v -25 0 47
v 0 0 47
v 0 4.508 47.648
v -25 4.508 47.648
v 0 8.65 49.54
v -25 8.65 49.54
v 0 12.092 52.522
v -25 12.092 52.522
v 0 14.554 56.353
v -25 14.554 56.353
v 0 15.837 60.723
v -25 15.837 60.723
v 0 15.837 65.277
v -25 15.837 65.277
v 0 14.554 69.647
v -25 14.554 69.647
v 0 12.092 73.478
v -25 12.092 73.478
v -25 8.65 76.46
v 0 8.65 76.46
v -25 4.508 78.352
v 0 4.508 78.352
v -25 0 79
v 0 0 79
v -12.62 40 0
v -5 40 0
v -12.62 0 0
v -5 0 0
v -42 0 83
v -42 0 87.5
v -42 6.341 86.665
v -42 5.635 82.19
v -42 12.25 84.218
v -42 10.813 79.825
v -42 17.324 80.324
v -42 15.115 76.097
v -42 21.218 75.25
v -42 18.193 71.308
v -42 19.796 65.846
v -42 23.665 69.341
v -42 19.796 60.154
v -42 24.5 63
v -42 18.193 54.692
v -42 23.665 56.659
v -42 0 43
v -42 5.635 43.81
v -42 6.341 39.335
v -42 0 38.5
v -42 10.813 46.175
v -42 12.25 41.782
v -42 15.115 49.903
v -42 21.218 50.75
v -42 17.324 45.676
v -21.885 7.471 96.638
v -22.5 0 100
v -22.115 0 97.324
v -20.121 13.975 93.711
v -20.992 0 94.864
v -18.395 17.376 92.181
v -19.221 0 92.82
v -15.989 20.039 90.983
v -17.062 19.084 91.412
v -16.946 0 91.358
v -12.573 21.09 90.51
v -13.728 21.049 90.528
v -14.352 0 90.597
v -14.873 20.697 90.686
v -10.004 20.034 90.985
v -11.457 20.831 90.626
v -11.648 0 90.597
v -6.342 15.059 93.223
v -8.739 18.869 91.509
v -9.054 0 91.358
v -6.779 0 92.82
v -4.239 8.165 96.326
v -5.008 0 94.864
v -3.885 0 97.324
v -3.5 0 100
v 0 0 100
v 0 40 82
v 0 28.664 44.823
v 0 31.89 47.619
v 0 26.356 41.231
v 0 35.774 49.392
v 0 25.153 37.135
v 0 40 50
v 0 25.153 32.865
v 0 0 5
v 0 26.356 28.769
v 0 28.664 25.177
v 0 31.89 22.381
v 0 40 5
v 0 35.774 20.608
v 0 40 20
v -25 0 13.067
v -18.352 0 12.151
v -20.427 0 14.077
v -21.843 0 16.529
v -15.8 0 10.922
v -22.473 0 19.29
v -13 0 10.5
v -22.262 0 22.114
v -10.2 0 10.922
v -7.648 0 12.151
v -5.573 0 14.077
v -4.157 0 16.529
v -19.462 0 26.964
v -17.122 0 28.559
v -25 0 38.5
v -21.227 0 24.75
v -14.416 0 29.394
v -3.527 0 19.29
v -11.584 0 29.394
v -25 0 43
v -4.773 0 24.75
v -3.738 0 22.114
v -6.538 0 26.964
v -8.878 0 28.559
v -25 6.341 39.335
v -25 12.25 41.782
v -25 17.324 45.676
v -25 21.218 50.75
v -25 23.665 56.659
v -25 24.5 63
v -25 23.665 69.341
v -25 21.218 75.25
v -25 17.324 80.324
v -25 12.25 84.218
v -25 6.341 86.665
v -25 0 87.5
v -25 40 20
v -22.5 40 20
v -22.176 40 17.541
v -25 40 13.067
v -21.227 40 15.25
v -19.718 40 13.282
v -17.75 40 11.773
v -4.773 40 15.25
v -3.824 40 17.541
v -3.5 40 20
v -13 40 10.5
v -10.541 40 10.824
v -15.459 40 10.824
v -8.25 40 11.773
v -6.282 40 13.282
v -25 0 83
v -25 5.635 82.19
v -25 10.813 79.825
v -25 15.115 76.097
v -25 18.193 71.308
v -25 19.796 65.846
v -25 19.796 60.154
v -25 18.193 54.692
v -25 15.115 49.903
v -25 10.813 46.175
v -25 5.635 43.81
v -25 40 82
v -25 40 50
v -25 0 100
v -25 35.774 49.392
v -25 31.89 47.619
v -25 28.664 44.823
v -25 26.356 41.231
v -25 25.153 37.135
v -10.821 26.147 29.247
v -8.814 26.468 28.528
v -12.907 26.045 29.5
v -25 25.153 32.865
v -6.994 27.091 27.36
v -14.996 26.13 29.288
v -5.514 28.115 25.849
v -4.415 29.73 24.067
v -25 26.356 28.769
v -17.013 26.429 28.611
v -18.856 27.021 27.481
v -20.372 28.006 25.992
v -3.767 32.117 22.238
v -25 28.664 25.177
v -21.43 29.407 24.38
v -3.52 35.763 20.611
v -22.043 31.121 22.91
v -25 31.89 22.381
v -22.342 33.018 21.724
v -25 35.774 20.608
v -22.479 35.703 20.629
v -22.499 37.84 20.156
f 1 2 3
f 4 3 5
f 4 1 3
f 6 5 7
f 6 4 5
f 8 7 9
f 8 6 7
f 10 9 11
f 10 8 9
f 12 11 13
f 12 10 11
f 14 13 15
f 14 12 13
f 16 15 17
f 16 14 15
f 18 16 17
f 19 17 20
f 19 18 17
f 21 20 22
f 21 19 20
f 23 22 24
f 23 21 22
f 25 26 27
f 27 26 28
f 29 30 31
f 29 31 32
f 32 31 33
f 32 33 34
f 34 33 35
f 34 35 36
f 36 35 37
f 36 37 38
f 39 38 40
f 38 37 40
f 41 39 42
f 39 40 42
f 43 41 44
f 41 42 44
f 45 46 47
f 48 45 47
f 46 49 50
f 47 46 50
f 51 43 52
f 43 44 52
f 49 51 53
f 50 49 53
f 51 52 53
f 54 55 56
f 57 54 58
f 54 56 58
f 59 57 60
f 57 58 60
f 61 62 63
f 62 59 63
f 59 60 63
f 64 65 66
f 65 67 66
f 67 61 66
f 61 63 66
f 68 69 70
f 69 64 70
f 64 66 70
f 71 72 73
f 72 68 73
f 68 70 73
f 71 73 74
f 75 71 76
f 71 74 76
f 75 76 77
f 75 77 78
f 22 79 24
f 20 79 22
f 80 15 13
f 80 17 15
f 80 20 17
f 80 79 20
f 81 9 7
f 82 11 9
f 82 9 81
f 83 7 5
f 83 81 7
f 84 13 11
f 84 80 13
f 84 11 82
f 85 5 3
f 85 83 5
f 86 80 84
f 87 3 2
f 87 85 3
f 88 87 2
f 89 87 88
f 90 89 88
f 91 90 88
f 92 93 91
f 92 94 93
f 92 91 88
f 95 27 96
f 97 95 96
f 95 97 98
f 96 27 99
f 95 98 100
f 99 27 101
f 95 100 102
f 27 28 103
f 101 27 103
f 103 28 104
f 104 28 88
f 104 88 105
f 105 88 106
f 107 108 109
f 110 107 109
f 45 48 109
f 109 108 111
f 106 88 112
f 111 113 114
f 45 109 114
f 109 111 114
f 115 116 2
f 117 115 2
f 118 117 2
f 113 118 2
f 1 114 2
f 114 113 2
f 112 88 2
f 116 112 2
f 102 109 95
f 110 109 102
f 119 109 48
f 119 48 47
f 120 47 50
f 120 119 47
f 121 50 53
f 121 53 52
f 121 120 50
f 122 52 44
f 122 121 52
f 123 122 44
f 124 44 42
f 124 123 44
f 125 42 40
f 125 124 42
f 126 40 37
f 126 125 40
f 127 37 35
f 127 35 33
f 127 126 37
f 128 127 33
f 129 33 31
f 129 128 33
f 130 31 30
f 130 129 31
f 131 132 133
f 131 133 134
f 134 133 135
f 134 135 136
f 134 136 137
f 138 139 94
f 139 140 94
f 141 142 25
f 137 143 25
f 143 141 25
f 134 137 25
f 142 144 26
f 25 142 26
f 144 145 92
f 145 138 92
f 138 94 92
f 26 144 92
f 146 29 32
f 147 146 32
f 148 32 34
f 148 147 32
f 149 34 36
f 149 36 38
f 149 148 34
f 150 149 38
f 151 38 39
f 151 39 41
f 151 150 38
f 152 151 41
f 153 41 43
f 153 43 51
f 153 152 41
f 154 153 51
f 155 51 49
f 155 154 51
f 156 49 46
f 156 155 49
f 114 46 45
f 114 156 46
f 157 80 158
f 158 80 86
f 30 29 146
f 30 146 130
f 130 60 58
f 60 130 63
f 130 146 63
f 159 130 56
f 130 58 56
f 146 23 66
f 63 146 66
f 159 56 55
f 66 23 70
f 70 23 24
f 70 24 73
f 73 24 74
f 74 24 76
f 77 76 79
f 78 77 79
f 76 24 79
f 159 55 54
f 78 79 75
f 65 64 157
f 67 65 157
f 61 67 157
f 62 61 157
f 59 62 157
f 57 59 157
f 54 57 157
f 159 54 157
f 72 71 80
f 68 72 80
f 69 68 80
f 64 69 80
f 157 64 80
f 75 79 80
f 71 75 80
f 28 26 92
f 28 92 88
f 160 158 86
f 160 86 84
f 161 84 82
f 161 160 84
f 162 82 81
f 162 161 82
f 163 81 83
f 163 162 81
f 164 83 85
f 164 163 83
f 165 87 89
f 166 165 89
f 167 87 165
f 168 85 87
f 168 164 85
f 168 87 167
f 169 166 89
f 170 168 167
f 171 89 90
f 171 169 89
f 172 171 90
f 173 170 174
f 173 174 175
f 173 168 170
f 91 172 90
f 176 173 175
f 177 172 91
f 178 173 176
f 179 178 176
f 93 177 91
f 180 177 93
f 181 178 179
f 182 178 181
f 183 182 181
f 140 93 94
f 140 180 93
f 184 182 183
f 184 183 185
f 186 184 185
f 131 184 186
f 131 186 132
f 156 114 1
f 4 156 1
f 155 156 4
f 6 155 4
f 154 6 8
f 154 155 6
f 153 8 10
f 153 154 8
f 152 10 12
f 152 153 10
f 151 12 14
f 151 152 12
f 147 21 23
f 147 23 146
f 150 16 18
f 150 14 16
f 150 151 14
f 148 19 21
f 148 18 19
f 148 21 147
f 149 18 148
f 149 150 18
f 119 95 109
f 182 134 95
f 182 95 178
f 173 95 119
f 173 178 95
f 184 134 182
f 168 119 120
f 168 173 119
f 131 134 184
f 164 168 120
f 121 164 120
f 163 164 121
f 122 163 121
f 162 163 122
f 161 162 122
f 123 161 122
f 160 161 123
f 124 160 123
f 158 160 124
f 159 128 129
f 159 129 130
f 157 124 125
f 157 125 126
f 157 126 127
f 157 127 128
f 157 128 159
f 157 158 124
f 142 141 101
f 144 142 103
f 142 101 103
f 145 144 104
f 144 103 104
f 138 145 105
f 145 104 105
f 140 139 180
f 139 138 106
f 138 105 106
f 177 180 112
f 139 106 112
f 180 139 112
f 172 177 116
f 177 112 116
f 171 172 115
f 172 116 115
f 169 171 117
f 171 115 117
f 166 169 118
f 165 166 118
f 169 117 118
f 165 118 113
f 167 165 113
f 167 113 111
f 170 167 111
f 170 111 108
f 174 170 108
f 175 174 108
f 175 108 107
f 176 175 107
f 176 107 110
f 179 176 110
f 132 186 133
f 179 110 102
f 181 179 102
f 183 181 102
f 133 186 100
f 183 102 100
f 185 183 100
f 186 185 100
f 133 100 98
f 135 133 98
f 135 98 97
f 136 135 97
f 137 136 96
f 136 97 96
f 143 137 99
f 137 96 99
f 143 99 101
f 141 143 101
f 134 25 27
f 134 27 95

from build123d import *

# Parameters (mm, degrees)
SALIENTE_EXTRUIR1_DEPTH    = 25
CORTAR_EXTRUIR1_START      = -94
CROQUIS2_R                 = 9.5
CORTAR_EXTRUIR1_DEPTH      = 148
CROQUIS3_R                 = 15
CROQUIS3_R_2               = 16
CORTAR_EXTRUIR2_DEPTH      = 94
CORTAR_EXTRUIR3_DEPTH      = 94
CHAFL_N2_SIZE              = 5
SALIENTE_EXTRUIR2_DEPTH    = 17
CHAFL_N2_OF_SIMETR_A1_SIZE = 5
CROQUIS6_W                 = 120.154705919
CROQUIS6_H                 = 59.700185721
CORTAR_EXTRUIR4_DEPTH      = 90


with BuildPart() as part:
    # Croquis1 → Saliente-Extruir1 (new body)
    with BuildSketch(Plane(origin=(0, 0, 0), x_dir=(0, 0, -1), z_dir=(1, 0, 0))):
        Polygon((-100, 0), (-82, 40), (0, 40), (0, 0), align=None)
    saliente_extruir1 = extrude(amount=SALIENTE_EXTRUIR1_DEPTH)

    # Croquis2 → Cortar-Extruir1 (cut)
    with BuildSketch(Plane(origin=(0, 40, 0), x_dir=(1, 0, 0), z_dir=(0, 1, 0)).offset(CORTAR_EXTRUIR1_START)):
        with Locations((13, -100)):
            Circle(CROQUIS2_R)
        with Locations((13, -20)):
            Circle(CROQUIS2_R)
    cortar_extruir1 = extrude(amount=CORTAR_EXTRUIR1_DEPTH, mode=Mode.SUBTRACT)

    # Croquis3 → Cortar-Extruir2 (cut, symmetric)
    with BuildSketch(Plane(origin=(25, 0, 0), x_dir=(0, 0, -1), z_dir=(1, 0, 0))):
        with Locations((-35, 40)):
            Circle(CROQUIS3_R)
        with Locations((-63, 0)):
            Circle(CROQUIS3_R_2)
    cortar_extruir2 = extrude(amount=CORTAR_EXTRUIR2_DEPTH, both=True, mode=Mode.SUBTRACT)

    # Croquis4 → Cortar-Extruir3 (cut, symmetric)
    with BuildSketch(Plane(origin=(0, 40, 0), x_dir=(1, 0, 0), z_dir=(0, 1, 0))):
        Polygon((12.62, 0), (25, -13.066583333), (25, 0), align=None)
    cortar_extruir3 = extrude(amount=CORTAR_EXTRUIR3_DEPTH, both=True, mode=Mode.SUBTRACT)

    # Chaflán2
    chafl_n2_edges = [part.edges().sort_by_distance(p)[0] for p in [
        (0, 20, 0),
    ]]
    chamfer(chafl_n2_edges, length=CHAFL_N2_SIZE)

    # Croquis5 → Saliente-Extruir2 (add)
    with BuildSketch(Plane(origin=(25, 0, 0), x_dir=(0, 0, -1), z_dir=(1, 0, 0))):
        with BuildLine():
            Line((-87.5, 0), (-83, 0))
            ThreePointArc((-83, 0), (-63, 20), (-43, 0))
            Line((-43, 0), (-38.5, 0))
            ThreePointArc((-38.5, 0), (-63, 24.5), (-87.5, 0))
        make_face()
    saliente_extruir2 = extrude(amount=SALIENTE_EXTRUIR2_DEPTH)


with BuildPart() as simetr_a1_1:
    # Simetría1: Saliente-Extruir1 across plane
    add(saliente_extruir1.mirror(Plane(origin=(0, 0, 0), x_dir=(0, 0, 1), z_dir=(1, 0, 0))))

    # Simetr_a1 2: Cortar-Extruir1, Cortar-Extruir2, Cortar-Extruir3 across plane
    add(cortar_extruir1.mirror(Plane(origin=(0, 0, 0), x_dir=(0, 0, 1), z_dir=(1, 0, 0))), mode=Mode.SUBTRACT)
    add(cortar_extruir2.mirror(Plane(origin=(0, 0, 0), x_dir=(0, 0, 1), z_dir=(1, 0, 0))), mode=Mode.SUBTRACT)
    add(cortar_extruir3.mirror(Plane(origin=(0, 0, 0), x_dir=(0, 0, 1), z_dir=(1, 0, 0))), mode=Mode.SUBTRACT)

    # Chaflán2 of Simetría1
    chafl_n2_of_simetr_a1_edges = [simetr_a1_1.edges().sort_by_distance(p)[0] for p in [
        (0, 20, 0),
    ]]
    chamfer(chafl_n2_of_simetr_a1_edges, length=CHAFL_N2_OF_SIMETR_A1_SIZE)


with BuildPart() as simetr_a1_3_1:
    # Simetr_a1 3: Saliente-Extruir2 across plane
    add(saliente_extruir2.mirror(Plane(origin=(0, 0, 0), x_dir=(0, 0, 1), z_dir=(1, 0, 0))))


with BuildPart() as part_1:
    add(part.part)

    # Simetría1 united with what the copies to: union Simetría1_1, Simetría1 3_1
    add(simetr_a1_1.part)
    add(simetr_a1_3_1.part)

    # Croquis6 → Cortar-Extruir4 (cut)
    with BuildSketch(Plane(origin=(0, 0, 0), x_dir=(0, 0, -1), z_dir=(1, 0, 0))):
        with Locations((-45.74339831, 19.581609369)):
            Rectangle(CROQUIS6_W, CROQUIS6_H)
    extrude(amount=CORTAR_EXTRUIR4_DEPTH, mode=Mode.SUBTRACT)


solid = part_1.part
